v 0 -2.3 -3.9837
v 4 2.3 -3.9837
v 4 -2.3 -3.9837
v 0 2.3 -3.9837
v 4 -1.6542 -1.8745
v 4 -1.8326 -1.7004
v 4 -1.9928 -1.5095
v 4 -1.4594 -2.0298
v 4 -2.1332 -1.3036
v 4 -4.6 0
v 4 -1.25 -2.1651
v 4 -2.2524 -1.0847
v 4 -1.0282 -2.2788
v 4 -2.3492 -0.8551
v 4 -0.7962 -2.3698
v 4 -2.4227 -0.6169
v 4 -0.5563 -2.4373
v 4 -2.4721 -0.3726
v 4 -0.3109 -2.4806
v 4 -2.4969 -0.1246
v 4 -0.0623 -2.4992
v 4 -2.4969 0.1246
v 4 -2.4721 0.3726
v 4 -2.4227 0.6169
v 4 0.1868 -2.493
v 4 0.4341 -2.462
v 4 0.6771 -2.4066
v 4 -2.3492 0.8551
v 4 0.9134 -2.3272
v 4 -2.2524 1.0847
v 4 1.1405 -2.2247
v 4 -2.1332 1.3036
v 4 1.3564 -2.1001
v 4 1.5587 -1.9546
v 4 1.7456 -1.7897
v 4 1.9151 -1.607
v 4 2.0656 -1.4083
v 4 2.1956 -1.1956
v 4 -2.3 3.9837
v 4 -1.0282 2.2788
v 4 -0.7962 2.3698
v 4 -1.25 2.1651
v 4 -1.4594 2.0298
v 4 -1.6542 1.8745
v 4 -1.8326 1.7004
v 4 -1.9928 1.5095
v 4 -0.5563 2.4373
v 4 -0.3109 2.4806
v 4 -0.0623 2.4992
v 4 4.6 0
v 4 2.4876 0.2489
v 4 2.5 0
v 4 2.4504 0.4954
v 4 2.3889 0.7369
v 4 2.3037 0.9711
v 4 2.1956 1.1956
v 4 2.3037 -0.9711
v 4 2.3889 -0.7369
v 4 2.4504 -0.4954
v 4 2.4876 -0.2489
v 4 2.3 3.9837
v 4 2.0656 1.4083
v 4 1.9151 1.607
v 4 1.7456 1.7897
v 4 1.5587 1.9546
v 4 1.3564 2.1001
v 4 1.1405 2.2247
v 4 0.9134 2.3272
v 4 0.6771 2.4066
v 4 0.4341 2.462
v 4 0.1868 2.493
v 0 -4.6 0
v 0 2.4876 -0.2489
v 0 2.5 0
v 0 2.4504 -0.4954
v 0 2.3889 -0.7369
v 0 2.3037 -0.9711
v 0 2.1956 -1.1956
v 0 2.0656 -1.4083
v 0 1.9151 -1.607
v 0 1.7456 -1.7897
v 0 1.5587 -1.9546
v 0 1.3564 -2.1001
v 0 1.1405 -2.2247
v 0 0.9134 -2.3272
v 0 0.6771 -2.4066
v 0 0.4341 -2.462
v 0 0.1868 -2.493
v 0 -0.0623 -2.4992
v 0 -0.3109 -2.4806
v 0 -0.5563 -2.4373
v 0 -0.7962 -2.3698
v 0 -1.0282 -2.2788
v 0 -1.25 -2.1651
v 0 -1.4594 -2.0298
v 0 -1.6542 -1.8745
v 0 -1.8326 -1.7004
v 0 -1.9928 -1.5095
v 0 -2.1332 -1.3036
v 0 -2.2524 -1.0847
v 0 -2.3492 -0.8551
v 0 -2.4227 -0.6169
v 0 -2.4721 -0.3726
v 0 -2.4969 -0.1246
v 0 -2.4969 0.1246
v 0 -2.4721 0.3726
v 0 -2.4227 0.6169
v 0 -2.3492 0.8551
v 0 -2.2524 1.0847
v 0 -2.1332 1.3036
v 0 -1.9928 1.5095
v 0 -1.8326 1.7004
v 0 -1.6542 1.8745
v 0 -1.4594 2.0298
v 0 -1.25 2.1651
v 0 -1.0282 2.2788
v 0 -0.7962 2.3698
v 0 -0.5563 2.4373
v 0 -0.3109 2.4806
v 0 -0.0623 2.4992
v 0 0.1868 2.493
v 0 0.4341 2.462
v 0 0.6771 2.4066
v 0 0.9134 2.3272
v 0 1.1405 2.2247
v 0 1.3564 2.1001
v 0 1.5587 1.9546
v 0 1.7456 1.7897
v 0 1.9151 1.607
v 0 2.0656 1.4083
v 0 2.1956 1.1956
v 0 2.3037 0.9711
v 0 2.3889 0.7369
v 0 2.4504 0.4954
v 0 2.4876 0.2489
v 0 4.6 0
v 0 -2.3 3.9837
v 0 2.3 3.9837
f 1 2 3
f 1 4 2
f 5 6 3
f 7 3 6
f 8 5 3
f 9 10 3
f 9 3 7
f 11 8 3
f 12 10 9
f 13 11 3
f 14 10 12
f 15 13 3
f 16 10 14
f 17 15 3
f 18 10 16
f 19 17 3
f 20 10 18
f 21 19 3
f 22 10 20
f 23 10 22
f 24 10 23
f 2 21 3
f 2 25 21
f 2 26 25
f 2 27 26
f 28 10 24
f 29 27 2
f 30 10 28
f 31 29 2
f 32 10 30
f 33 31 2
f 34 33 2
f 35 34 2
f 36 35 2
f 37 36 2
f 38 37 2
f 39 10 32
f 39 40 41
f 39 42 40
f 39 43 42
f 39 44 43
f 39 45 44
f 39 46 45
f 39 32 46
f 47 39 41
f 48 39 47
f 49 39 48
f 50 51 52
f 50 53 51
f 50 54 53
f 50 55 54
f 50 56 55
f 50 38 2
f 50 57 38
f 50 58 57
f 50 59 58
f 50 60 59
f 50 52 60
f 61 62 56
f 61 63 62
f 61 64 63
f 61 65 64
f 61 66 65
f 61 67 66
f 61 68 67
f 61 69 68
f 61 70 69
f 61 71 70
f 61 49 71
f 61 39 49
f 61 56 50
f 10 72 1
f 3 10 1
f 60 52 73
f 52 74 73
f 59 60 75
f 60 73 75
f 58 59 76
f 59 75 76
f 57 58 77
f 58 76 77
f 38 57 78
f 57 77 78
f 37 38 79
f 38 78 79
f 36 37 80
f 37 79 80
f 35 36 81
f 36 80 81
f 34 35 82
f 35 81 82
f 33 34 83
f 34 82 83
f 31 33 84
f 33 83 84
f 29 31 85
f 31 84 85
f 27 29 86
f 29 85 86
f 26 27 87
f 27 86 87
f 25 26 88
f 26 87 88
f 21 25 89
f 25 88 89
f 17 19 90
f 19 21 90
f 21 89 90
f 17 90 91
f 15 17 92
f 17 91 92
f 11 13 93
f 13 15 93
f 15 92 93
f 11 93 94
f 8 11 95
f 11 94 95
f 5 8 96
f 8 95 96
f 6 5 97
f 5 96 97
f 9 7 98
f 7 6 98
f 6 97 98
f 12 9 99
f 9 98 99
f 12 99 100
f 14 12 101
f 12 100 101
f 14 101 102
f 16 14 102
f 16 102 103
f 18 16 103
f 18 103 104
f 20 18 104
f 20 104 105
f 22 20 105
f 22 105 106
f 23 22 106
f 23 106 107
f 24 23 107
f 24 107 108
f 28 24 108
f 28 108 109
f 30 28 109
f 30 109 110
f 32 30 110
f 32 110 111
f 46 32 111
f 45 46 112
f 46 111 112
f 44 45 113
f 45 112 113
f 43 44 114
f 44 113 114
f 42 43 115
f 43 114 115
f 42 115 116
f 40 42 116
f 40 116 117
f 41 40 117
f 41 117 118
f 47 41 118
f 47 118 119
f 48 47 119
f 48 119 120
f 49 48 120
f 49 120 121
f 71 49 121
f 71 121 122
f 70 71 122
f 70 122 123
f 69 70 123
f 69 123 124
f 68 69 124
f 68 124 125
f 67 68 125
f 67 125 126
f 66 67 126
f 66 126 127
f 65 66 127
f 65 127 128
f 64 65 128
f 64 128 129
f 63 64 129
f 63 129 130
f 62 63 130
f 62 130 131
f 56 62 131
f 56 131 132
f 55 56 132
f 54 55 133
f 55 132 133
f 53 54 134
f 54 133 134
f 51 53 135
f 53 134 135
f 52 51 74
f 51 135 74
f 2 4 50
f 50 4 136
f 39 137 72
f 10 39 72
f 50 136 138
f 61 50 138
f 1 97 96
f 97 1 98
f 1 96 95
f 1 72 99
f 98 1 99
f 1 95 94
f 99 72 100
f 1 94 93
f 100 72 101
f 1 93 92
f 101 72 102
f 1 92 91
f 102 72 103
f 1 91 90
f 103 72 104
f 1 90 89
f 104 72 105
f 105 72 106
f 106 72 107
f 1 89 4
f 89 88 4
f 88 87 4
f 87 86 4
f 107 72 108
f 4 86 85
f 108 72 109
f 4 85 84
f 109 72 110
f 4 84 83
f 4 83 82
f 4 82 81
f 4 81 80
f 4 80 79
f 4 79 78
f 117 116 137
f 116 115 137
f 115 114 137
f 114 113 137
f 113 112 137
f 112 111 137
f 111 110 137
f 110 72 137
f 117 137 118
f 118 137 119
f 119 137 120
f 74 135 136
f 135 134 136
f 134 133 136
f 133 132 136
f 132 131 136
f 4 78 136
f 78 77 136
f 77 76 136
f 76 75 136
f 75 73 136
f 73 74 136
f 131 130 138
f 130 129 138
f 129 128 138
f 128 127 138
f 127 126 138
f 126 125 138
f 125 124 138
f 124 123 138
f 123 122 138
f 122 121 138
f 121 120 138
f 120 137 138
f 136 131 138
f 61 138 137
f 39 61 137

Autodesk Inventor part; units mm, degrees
ref_plane "YZ Plane" through (0, 0, 0) normal (1, 0, 0) x (0, 1, 0)
ref_plane "XZ Plane" through (0, 0, 0) normal (0, 1, 0) x (-1, 0, 0)
ref_plane "XY Plane" through (0, 0, 0) normal (0, 0, 1) x (1, 0, 0)
sketch "スケッチ1" plane through (0, 0, 0) normal (1, 0, 0) x (0, 1, 0)
  circle A0 centre (0, 0) radius 4.6
  line L0 (4.6, 0) -> (2.3, 3.9837)
  line L1 (2.3, 3.9837) -> (-2.3, 3.9837)
  line L2 (-2.3, 3.9837) -> (-4.6, 0)
  line L3 (-4.6, 0) -> (-2.3, -3.9837)
  line L4 (2.3, -3.9837) -> (-2.3, -3.9837)
  line L5 (2.3, -3.9837) -> (4.6, 0)
  circle A1 centre (0, 0) radius 2.5
  point P0 (-2.3, -3.9837)
  dimension "d0" = 9.2
  dimension "d3" = 360
  dimension "d5" = 5
extrude "押し出し1" add sketch "スケッチ1" along normal blind 4 contours L5 L4 L3 L2 L1 L0
properties part number "5min-nut" material "アルミニウム 6061"
